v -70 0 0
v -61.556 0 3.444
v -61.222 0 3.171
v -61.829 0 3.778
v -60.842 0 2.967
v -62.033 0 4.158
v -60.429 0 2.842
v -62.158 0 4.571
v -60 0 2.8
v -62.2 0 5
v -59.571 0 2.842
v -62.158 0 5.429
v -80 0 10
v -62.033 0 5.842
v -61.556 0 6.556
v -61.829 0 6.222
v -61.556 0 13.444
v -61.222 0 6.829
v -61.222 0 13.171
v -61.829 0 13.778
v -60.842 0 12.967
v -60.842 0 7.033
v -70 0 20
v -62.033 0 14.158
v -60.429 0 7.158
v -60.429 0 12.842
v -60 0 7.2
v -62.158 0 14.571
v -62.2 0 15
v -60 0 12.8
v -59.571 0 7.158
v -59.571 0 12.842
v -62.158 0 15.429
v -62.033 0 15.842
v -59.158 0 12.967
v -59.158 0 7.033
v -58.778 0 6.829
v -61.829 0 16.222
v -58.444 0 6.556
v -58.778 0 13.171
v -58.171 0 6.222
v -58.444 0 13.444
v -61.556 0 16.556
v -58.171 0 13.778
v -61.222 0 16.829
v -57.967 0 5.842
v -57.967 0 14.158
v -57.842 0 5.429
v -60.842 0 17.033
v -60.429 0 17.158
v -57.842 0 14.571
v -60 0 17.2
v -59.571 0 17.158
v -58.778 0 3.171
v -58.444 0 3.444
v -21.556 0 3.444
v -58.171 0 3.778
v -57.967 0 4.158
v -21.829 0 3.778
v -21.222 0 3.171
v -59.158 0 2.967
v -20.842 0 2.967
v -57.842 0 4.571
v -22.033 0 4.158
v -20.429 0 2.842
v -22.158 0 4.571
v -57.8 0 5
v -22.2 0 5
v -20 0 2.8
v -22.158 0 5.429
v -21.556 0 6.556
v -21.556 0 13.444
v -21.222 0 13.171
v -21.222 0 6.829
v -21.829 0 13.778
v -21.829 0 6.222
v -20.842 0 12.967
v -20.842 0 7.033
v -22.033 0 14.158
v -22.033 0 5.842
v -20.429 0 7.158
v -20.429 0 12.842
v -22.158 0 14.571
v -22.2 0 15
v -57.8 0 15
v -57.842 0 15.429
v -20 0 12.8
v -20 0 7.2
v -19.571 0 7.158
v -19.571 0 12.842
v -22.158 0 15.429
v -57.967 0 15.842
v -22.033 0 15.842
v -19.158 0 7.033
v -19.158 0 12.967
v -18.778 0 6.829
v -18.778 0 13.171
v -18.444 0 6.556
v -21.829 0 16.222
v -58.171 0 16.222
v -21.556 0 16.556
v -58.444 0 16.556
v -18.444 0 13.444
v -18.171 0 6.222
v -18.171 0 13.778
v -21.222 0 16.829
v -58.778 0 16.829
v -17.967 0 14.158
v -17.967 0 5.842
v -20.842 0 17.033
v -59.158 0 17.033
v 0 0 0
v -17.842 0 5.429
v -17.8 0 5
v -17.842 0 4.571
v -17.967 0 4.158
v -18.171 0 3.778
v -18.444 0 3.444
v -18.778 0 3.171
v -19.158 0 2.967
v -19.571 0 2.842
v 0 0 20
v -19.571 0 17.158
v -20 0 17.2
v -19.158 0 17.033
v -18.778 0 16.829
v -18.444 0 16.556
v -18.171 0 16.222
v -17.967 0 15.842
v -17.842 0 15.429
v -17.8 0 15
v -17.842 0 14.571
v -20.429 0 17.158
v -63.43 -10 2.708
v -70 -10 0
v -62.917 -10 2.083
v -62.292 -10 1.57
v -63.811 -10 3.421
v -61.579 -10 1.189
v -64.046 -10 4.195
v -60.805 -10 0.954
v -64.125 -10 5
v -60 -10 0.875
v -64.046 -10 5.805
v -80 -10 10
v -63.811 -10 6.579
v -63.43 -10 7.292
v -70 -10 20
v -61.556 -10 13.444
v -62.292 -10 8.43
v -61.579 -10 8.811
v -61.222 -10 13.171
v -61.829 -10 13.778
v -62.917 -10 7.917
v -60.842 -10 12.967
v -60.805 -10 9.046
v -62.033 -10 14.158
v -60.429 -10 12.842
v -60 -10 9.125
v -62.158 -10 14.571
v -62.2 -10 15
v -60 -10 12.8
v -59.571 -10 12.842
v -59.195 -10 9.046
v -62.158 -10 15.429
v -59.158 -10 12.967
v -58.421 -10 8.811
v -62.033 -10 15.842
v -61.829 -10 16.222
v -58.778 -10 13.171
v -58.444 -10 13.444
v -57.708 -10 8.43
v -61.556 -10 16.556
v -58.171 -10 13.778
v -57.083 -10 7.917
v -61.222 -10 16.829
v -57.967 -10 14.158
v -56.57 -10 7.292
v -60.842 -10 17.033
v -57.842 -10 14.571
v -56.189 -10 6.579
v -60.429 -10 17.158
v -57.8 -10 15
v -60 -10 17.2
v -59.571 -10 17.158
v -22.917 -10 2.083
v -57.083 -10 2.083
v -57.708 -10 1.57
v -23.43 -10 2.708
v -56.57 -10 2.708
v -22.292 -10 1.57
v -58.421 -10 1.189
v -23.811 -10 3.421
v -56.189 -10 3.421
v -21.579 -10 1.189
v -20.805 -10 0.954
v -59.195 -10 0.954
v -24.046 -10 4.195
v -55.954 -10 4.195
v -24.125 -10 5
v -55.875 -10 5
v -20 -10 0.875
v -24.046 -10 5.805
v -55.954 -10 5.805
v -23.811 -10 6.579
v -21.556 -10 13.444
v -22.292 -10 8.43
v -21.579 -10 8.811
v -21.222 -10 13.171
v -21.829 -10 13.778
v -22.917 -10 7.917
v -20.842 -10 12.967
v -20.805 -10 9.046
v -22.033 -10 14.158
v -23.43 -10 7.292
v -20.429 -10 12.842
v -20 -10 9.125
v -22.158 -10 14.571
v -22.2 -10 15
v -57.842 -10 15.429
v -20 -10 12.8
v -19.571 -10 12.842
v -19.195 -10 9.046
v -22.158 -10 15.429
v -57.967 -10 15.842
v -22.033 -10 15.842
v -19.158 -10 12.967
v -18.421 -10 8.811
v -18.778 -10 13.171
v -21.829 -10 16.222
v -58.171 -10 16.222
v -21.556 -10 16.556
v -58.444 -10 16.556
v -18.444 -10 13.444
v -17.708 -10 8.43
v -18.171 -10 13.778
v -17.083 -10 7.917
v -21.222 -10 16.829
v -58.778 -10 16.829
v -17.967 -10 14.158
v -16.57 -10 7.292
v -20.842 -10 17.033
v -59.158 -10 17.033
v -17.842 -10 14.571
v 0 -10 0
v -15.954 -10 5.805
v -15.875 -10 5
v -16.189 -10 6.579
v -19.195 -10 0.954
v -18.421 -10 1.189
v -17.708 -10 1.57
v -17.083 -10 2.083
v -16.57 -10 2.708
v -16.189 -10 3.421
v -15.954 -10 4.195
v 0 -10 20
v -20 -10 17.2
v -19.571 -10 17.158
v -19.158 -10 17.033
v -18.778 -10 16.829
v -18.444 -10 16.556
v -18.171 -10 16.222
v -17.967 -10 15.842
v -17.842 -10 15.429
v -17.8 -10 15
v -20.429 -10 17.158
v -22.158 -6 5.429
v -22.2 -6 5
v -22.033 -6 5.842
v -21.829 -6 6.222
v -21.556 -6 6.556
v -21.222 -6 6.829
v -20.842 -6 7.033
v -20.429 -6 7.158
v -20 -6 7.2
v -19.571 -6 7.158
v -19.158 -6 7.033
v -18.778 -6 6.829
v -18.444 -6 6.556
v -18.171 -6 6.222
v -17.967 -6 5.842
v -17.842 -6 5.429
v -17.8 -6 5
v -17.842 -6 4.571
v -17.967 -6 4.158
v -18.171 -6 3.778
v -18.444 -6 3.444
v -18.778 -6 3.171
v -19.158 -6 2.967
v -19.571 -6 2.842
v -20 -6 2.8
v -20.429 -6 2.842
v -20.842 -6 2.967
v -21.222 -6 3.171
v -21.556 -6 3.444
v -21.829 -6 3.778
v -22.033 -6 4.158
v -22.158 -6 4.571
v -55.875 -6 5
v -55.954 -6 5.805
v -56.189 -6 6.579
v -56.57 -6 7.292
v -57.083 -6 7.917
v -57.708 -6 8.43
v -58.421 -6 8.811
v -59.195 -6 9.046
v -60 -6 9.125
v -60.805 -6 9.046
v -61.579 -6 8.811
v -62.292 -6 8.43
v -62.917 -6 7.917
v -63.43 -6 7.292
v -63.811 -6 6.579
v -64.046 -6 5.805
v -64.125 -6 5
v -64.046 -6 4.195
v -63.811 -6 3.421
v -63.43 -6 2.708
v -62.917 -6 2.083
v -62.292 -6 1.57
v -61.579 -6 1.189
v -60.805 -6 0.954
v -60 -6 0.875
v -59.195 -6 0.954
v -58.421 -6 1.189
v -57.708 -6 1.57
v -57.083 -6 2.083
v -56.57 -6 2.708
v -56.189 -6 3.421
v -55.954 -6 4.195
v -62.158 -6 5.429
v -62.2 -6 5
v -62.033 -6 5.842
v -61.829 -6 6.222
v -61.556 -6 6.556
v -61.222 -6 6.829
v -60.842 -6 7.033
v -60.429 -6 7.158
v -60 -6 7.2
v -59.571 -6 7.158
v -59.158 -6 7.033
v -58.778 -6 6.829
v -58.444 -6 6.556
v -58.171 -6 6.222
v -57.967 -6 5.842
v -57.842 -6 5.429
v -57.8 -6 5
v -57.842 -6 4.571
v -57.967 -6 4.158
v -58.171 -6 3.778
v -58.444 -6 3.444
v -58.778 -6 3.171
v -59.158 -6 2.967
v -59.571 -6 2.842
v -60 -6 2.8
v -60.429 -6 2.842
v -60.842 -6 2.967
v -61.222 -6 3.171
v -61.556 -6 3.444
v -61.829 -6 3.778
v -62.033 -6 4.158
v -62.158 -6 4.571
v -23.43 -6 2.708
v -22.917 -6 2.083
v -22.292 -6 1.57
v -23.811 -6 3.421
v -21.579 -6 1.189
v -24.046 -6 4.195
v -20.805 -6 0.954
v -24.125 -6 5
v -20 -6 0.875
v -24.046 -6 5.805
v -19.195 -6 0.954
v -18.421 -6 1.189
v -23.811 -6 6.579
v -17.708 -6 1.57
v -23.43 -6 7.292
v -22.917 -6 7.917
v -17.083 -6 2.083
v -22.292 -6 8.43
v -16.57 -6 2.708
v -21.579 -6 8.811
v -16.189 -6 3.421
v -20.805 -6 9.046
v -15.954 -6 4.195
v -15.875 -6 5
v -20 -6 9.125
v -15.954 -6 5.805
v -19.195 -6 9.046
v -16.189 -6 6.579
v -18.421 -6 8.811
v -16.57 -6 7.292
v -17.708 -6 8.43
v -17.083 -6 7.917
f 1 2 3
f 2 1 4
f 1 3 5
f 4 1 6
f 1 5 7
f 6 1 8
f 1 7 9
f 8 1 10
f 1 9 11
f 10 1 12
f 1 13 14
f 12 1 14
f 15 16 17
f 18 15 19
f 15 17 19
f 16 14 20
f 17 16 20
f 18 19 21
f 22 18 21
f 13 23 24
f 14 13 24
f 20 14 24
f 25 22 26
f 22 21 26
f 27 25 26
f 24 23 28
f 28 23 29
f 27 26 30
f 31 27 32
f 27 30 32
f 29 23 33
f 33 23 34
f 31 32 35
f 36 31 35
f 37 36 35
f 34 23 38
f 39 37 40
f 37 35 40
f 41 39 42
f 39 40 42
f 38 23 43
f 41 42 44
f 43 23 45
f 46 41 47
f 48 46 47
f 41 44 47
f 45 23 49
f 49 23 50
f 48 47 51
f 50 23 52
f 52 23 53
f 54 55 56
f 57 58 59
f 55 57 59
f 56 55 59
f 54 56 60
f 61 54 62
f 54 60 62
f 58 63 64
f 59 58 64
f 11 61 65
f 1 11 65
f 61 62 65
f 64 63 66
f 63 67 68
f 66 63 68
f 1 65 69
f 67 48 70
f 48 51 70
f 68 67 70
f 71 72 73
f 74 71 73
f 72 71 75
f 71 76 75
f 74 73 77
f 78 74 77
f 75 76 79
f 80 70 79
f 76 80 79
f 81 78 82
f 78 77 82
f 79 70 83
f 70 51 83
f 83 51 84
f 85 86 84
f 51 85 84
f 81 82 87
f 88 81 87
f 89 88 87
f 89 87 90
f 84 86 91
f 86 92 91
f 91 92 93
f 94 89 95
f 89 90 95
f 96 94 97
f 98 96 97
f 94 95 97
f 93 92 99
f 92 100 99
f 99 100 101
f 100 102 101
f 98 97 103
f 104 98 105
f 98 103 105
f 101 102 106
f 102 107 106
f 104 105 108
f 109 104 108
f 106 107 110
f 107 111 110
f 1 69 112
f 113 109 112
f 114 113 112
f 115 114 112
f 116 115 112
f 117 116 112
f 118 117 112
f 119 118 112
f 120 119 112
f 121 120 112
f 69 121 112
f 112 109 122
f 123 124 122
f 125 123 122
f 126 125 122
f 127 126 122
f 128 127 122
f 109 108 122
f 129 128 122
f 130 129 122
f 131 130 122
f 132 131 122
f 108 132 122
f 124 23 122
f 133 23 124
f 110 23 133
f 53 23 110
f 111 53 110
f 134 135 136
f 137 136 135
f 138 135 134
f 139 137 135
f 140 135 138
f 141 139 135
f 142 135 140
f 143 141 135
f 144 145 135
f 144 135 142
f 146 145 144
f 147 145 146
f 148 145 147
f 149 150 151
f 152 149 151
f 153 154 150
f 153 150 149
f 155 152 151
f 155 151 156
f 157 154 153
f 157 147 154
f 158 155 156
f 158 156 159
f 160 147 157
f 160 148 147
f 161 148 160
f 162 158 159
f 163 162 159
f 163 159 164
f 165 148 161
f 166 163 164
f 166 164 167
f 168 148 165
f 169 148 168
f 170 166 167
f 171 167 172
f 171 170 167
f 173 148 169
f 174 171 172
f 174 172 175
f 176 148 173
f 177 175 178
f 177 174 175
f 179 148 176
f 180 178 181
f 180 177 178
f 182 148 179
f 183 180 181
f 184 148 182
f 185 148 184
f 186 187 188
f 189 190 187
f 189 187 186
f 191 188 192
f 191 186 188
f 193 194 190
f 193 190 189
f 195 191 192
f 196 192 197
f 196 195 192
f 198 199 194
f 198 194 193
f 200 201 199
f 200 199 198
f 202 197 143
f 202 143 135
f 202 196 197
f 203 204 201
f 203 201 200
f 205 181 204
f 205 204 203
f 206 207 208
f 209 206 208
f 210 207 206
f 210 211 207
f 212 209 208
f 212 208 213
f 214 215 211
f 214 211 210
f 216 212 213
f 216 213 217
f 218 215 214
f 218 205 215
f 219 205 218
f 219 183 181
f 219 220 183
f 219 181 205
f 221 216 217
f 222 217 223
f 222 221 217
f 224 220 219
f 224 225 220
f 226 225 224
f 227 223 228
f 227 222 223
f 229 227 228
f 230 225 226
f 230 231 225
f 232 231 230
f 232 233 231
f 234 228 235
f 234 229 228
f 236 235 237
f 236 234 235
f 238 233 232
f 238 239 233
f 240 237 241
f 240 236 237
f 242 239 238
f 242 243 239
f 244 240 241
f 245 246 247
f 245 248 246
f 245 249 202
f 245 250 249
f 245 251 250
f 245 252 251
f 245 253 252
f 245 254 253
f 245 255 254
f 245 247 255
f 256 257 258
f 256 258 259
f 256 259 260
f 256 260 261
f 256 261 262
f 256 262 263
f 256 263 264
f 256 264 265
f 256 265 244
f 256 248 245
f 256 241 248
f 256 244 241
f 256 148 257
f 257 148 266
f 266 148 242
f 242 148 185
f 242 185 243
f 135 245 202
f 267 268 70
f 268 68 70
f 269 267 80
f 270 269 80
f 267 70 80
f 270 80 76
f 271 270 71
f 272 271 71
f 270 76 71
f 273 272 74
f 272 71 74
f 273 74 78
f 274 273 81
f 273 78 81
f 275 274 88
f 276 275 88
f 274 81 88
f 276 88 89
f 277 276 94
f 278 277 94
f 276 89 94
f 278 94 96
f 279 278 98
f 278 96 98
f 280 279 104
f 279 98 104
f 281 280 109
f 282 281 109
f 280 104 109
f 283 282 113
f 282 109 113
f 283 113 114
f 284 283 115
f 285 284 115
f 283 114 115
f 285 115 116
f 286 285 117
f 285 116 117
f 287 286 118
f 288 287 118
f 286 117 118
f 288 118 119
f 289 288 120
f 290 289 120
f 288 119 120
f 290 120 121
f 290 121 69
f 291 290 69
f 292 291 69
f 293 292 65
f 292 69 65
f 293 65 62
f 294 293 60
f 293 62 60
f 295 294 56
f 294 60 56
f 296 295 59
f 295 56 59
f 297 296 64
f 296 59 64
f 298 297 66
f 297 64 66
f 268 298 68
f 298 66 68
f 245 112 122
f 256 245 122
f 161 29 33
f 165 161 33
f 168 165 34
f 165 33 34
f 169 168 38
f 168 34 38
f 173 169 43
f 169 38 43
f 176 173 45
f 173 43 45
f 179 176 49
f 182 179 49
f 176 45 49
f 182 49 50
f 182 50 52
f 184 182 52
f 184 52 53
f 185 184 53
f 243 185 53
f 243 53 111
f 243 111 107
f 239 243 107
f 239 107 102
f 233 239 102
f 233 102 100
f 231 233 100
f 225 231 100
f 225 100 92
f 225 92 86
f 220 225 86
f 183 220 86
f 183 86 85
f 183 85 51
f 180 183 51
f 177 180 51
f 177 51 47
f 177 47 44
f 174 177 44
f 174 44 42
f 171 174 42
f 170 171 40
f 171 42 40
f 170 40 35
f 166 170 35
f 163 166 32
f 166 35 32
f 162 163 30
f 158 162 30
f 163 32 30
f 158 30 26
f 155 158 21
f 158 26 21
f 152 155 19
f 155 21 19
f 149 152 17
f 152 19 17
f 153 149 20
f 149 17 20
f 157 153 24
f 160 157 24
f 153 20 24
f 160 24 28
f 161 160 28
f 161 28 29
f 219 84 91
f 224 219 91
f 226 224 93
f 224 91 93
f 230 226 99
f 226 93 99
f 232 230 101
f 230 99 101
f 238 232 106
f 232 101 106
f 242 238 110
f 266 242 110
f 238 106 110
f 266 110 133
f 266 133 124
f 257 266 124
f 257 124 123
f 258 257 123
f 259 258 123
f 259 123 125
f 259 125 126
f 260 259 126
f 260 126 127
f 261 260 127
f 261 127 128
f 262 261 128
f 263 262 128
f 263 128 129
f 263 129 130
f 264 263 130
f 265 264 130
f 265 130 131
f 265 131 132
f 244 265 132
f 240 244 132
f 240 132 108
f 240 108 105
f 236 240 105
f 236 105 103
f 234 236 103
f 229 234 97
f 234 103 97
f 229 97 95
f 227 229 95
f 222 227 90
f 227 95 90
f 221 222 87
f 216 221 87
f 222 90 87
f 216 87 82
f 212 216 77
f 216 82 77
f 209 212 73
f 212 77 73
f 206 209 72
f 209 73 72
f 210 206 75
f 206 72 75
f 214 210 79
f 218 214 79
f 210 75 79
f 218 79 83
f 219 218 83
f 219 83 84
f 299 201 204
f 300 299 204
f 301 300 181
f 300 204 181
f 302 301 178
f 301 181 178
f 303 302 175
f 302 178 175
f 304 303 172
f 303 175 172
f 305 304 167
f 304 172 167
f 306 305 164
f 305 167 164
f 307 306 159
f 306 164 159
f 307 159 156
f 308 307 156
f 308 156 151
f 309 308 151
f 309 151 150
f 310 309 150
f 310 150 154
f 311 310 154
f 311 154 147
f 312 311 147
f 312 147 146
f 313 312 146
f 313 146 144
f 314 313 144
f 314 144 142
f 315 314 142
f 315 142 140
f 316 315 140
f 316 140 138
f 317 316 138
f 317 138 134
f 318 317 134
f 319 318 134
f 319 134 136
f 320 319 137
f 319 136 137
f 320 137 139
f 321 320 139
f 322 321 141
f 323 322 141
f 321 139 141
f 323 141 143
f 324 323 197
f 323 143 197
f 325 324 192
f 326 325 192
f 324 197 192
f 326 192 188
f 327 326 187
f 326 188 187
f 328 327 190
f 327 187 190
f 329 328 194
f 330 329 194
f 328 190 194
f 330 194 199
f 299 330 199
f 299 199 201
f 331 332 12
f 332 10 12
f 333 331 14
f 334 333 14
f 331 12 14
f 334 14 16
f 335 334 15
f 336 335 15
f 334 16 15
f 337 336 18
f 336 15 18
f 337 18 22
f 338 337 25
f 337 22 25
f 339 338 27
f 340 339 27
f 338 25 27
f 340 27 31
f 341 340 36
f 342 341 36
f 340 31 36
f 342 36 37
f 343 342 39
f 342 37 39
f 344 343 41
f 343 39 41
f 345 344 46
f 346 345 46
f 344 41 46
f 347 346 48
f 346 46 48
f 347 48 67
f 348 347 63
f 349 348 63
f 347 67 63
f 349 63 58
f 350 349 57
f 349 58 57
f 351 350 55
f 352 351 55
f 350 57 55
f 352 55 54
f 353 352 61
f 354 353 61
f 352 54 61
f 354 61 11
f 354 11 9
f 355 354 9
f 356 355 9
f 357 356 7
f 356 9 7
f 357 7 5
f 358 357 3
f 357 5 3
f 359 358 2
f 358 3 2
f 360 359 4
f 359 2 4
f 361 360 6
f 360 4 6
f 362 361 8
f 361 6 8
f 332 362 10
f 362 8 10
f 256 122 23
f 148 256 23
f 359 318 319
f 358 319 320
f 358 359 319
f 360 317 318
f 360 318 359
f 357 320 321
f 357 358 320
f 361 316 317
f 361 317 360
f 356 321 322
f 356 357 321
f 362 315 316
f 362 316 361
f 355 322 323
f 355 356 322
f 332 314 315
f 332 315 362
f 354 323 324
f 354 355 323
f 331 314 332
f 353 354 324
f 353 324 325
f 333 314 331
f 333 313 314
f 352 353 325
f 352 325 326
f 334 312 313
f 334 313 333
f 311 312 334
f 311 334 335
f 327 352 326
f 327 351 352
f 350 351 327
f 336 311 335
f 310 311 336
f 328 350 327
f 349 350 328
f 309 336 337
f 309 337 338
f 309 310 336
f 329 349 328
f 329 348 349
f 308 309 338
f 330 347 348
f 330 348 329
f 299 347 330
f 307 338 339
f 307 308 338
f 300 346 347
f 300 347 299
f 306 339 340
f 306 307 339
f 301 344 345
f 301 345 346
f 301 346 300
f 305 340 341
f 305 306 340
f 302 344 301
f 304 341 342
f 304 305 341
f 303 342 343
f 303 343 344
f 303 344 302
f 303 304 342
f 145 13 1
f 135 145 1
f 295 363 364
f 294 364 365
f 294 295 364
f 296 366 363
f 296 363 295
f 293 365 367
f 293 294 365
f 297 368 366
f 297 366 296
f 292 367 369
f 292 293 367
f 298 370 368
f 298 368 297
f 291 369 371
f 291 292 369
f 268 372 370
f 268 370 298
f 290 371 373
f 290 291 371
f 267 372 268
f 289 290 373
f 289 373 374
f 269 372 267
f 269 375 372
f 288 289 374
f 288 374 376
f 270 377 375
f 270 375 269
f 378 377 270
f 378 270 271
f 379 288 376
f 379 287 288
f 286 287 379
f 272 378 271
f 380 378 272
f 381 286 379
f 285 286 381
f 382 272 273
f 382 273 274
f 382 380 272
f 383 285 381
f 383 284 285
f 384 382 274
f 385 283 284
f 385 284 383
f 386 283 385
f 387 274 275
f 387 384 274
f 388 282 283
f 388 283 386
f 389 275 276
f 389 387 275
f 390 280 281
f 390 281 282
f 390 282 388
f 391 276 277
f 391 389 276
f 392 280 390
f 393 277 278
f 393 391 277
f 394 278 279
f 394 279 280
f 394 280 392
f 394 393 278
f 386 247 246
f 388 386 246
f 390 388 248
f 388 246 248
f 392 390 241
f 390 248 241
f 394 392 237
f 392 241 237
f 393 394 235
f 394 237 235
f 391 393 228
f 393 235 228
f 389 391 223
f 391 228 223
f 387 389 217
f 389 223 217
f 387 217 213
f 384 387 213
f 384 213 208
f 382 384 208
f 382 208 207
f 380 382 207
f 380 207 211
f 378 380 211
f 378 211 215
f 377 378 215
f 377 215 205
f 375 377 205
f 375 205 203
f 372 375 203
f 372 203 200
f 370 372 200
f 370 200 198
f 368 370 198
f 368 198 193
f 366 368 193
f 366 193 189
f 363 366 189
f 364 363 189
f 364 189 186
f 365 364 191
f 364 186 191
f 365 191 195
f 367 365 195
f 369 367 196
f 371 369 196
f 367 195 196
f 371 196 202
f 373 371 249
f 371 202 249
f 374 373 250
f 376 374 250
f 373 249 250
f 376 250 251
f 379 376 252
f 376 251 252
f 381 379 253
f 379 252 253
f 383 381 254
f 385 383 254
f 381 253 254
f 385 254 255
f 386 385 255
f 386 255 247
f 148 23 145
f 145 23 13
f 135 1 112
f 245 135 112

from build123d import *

# Parameters (mm, degrees)
F1_DEPTH       = 10
F3_D           = 4.4
F3_CBORE_D     = 8.25
F3_CBORE_DEPTH = 4
F5_D           = 4.4


# Not quite as in the source:
# - a feature names something its author has since deleted; it is built from what else it names


with BuildPart() as f1:
    # F0 (on Front) → F1 (new body)
    with BuildSketch(Plane.XZ):
        Polygon((-80, 10), (0, 10), (0, 20), (-70, 20), align=None)
        Polygon((-70, 0), (0, 0), (0, 10), (-80, 10), align=None)
    extrude(amount=F1_DEPTH)

    # F3 (through all)
    with Locations(Plane.XZ.offset(10)):
        with Locations((-20, 5), (-60, 5)):
            CounterBoreHole(F3_D / 2, F3_CBORE_D / 2, F3_CBORE_DEPTH)

    # F5 (through all)
    with Locations(Plane.XZ.offset(10)):
        with Locations((-60, 15), (-20, 15)):
            Hole(F5_D / 2)


solid = f1.part
